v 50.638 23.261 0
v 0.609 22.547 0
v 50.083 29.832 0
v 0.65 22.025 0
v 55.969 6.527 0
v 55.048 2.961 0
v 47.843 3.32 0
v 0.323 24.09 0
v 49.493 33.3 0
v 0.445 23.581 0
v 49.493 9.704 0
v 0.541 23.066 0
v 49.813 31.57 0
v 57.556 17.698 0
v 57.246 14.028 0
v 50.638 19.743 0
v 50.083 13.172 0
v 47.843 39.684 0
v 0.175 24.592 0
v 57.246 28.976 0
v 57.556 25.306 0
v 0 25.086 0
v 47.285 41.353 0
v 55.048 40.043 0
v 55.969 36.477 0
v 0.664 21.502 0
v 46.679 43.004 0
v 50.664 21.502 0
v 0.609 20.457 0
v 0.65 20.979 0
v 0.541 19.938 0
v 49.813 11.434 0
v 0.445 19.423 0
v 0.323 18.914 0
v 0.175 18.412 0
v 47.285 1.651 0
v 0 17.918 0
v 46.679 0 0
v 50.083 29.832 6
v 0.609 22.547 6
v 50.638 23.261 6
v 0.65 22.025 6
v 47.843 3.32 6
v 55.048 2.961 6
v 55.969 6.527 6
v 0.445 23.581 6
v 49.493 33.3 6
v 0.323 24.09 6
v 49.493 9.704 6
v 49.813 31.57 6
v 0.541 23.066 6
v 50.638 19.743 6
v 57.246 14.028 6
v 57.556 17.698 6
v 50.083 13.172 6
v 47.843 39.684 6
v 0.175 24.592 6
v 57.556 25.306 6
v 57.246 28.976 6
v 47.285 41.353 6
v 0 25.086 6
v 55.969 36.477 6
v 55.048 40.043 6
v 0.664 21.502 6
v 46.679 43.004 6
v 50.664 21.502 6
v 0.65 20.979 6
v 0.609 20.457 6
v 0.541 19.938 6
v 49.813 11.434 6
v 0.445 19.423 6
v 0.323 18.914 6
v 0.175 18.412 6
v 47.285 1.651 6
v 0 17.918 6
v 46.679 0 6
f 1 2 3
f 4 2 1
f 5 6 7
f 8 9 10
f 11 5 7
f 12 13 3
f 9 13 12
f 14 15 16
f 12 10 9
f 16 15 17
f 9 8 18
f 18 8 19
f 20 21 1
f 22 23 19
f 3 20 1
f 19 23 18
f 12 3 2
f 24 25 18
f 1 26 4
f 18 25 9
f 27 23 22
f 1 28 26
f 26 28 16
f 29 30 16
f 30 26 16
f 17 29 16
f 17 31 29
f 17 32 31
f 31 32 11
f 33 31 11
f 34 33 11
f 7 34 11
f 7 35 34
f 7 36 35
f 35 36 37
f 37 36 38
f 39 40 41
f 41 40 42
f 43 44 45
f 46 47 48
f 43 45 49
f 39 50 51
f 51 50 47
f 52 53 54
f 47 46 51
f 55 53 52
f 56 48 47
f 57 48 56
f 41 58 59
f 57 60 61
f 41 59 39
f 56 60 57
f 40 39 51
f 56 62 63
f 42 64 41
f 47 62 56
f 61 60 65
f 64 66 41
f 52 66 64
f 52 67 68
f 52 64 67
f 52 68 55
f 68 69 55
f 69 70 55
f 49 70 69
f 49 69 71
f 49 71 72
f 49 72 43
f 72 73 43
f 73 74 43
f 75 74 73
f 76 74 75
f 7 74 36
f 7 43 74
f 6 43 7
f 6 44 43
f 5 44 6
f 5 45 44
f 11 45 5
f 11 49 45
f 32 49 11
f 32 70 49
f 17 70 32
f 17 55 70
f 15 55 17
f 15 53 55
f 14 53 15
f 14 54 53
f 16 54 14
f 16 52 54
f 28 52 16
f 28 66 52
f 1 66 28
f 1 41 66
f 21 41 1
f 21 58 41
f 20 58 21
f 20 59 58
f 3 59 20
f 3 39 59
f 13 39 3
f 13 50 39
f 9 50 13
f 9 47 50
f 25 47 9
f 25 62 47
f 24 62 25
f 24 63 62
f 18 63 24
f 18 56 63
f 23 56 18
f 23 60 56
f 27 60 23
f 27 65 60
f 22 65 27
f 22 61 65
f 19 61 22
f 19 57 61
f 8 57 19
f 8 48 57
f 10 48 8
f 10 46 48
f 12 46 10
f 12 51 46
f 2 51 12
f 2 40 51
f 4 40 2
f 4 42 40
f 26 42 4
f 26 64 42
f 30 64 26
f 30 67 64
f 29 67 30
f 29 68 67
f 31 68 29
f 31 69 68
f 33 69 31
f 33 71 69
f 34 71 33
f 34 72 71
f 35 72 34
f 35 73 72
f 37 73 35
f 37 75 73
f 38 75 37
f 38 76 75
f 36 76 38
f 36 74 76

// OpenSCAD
$fn = 32;

// ----------------------------------------------------------------------
// Gear sector: 4 teeth on 42 degrees
// ----------------------------------------------------------------------

// --- parameters (mm) ---
sector_angle = 42;        // sector angle, degrees
root_r = 60;              // root circle radius
tooth_h = 7;              // tooth height over the root circle
teeth = 4;                // number of teeth on the sector
hub_r = 10;               // hub bore radius
plate_t = 6;              // sector thickness, Z
arc_step = 3;             // sampling step of the root/hub arcs, degrees

tip_r = root_r + tooth_h;  // tip circle radius

profile = [[46.679, 0], [47.285, 1.651], [47.843, 3.32], [55.048, 2.961], [55.969, 6.527], [49.493, 9.704], [49.813, 11.434], [50.083, 13.172], [57.246, 14.028], [57.556, 17.698], [50.638, 19.743], [50.664, 21.502], [50.638, 23.261], [57.556, 25.306], [57.246, 28.976], [50.083, 29.832], [49.813, 31.57], [49.493, 33.3], [55.969, 36.477], [55.048, 40.043], [47.843, 39.684], [47.285, 41.353], [46.679, 43.004], [0, 25.086], [0.175, 24.592], [0.323, 24.09], [0.445, 23.581], [0.541, 23.066], [0.609, 22.547], [0.65, 22.025], [0.664, 21.502], [0.65, 20.979], [0.609, 20.457], [0.541, 19.938], [0.445, 19.423], [0.323, 18.914], [0.175, 18.412], [0, 17.918]];  // primary outline, 38 points, counter clockwise

// --- the one profile operation ---
linear_extrude(height = plate_t) polygon(points = profile);
